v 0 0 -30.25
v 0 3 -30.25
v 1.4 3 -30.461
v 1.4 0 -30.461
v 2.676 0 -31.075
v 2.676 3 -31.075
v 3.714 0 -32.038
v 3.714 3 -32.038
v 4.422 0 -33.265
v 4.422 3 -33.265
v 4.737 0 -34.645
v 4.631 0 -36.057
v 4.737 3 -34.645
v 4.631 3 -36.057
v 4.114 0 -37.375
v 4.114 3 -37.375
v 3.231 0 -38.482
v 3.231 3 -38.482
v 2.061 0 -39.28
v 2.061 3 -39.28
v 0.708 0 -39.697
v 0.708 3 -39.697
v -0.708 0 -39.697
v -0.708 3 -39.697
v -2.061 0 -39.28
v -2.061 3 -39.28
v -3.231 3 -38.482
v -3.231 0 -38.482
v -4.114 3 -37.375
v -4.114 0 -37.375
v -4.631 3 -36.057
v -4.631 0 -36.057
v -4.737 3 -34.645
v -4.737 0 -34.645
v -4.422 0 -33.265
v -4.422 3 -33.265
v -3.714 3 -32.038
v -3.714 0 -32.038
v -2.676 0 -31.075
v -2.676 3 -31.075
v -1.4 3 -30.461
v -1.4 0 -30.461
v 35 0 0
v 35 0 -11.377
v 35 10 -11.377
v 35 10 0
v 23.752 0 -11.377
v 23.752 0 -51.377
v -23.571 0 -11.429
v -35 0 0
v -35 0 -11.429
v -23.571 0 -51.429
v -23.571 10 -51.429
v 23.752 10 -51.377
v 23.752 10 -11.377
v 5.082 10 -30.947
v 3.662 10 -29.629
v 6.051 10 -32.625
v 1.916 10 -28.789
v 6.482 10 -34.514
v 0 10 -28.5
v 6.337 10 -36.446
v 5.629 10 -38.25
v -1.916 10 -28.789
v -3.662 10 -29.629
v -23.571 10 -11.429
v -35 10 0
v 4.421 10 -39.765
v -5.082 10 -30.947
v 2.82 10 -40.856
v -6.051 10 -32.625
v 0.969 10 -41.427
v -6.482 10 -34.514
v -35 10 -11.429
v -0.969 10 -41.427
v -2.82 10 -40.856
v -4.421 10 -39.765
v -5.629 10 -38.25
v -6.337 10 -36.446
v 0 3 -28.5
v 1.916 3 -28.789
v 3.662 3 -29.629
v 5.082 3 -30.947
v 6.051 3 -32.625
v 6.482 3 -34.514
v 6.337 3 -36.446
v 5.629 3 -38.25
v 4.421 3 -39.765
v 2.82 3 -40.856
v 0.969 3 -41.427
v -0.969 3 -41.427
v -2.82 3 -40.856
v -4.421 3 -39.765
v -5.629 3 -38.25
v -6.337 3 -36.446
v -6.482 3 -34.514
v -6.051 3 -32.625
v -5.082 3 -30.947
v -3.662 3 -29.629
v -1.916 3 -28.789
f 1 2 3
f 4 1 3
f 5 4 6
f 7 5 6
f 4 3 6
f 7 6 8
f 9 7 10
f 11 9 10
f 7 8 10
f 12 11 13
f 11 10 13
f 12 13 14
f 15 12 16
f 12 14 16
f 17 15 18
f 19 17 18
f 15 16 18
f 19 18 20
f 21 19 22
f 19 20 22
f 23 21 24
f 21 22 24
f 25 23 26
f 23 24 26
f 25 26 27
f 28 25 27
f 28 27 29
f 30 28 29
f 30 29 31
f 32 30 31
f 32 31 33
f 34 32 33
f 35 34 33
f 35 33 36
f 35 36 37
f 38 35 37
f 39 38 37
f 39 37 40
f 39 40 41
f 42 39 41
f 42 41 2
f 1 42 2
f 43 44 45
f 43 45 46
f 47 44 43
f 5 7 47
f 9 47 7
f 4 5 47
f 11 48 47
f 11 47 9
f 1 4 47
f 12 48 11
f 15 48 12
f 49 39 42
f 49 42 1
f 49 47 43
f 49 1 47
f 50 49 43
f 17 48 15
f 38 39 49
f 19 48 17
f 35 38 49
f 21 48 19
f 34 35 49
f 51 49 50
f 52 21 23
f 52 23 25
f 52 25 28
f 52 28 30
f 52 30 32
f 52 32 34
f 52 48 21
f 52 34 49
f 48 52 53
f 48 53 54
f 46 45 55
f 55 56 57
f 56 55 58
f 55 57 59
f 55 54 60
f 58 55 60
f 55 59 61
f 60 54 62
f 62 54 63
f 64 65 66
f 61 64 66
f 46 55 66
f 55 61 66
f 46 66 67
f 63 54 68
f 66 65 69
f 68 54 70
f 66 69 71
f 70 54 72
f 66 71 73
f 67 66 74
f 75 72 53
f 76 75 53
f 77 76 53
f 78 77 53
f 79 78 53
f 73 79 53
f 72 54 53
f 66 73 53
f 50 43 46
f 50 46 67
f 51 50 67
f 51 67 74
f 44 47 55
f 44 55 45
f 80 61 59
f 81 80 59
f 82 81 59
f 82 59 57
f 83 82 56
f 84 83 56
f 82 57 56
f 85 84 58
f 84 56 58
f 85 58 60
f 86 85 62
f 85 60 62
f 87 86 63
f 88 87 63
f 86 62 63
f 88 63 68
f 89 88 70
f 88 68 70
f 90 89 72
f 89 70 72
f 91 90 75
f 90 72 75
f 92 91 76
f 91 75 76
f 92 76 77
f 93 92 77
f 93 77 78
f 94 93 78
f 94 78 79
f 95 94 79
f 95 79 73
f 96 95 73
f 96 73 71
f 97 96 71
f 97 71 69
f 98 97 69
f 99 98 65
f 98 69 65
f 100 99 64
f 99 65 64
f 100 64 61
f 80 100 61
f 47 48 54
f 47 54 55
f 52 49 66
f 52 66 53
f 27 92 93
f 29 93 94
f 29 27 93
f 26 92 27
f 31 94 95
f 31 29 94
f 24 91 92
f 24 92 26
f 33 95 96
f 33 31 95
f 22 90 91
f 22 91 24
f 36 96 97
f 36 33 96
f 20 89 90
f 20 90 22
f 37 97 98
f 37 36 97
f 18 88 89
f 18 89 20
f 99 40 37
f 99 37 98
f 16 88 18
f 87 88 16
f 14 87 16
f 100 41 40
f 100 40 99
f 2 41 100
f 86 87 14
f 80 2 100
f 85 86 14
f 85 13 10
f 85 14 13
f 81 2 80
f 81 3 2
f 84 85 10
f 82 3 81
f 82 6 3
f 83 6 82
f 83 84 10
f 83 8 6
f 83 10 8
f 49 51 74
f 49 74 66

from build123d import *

# Parameters (mm, degrees)
BOSS_EXTRUDE1_DEPTH = 10
SKETCH2_R           = 6.5
CUT_EXTRUDE2_DEPTH  = 7
SKETCH5_R           = 4.75
CUT_EXTRUDE3_DEPTH  = 63.601101901


with BuildPart() as part:
    # Sketch1 → Boss-Extrude1 (new body)
    with BuildSketch(Plane(origin=(0, 0, 0), x_dir=(1, 0, 0), z_dir=(0, 1, 0))):
        Polygon((-23.571428571, 51.428571429), (23.752103043, 51.377146806), (23.752103043, 11.377146806), (35, 11.377146806), (35, 0), (-35, 0), (-35, 11.428571429), (-23.571428571, 11.428571429), align=None)
    extrude(amount=BOSS_EXTRUDE1_DEPTH)

    # Sketch2 → Cut-Extrude2 (cut)
    with BuildSketch(Plane(origin=(0, 10, 0), x_dir=(1, 0, 0), z_dir=(0, 1, 0))):
        with Locations(Location((0, 35, 0), (0, 0, 270))):
            Circle(SKETCH2_R)
    extrude(amount=-CUT_EXTRUDE2_DEPTH, mode=Mode.SUBTRACT)

    # Sketch5 → Cut-Extrude3 (cut, through all)
    with BuildSketch(Plane(origin=(0, 3, 0), x_dir=(1, 0, 0), z_dir=(0, 1, 0))):
        with Locations(Location((0, 35, 0), (0, 0, 270))):
            Circle(SKETCH5_R)
    extrude(amount=-CUT_EXTRUDE3_DEPTH, mode=Mode.SUBTRACT)


solid = part.part
